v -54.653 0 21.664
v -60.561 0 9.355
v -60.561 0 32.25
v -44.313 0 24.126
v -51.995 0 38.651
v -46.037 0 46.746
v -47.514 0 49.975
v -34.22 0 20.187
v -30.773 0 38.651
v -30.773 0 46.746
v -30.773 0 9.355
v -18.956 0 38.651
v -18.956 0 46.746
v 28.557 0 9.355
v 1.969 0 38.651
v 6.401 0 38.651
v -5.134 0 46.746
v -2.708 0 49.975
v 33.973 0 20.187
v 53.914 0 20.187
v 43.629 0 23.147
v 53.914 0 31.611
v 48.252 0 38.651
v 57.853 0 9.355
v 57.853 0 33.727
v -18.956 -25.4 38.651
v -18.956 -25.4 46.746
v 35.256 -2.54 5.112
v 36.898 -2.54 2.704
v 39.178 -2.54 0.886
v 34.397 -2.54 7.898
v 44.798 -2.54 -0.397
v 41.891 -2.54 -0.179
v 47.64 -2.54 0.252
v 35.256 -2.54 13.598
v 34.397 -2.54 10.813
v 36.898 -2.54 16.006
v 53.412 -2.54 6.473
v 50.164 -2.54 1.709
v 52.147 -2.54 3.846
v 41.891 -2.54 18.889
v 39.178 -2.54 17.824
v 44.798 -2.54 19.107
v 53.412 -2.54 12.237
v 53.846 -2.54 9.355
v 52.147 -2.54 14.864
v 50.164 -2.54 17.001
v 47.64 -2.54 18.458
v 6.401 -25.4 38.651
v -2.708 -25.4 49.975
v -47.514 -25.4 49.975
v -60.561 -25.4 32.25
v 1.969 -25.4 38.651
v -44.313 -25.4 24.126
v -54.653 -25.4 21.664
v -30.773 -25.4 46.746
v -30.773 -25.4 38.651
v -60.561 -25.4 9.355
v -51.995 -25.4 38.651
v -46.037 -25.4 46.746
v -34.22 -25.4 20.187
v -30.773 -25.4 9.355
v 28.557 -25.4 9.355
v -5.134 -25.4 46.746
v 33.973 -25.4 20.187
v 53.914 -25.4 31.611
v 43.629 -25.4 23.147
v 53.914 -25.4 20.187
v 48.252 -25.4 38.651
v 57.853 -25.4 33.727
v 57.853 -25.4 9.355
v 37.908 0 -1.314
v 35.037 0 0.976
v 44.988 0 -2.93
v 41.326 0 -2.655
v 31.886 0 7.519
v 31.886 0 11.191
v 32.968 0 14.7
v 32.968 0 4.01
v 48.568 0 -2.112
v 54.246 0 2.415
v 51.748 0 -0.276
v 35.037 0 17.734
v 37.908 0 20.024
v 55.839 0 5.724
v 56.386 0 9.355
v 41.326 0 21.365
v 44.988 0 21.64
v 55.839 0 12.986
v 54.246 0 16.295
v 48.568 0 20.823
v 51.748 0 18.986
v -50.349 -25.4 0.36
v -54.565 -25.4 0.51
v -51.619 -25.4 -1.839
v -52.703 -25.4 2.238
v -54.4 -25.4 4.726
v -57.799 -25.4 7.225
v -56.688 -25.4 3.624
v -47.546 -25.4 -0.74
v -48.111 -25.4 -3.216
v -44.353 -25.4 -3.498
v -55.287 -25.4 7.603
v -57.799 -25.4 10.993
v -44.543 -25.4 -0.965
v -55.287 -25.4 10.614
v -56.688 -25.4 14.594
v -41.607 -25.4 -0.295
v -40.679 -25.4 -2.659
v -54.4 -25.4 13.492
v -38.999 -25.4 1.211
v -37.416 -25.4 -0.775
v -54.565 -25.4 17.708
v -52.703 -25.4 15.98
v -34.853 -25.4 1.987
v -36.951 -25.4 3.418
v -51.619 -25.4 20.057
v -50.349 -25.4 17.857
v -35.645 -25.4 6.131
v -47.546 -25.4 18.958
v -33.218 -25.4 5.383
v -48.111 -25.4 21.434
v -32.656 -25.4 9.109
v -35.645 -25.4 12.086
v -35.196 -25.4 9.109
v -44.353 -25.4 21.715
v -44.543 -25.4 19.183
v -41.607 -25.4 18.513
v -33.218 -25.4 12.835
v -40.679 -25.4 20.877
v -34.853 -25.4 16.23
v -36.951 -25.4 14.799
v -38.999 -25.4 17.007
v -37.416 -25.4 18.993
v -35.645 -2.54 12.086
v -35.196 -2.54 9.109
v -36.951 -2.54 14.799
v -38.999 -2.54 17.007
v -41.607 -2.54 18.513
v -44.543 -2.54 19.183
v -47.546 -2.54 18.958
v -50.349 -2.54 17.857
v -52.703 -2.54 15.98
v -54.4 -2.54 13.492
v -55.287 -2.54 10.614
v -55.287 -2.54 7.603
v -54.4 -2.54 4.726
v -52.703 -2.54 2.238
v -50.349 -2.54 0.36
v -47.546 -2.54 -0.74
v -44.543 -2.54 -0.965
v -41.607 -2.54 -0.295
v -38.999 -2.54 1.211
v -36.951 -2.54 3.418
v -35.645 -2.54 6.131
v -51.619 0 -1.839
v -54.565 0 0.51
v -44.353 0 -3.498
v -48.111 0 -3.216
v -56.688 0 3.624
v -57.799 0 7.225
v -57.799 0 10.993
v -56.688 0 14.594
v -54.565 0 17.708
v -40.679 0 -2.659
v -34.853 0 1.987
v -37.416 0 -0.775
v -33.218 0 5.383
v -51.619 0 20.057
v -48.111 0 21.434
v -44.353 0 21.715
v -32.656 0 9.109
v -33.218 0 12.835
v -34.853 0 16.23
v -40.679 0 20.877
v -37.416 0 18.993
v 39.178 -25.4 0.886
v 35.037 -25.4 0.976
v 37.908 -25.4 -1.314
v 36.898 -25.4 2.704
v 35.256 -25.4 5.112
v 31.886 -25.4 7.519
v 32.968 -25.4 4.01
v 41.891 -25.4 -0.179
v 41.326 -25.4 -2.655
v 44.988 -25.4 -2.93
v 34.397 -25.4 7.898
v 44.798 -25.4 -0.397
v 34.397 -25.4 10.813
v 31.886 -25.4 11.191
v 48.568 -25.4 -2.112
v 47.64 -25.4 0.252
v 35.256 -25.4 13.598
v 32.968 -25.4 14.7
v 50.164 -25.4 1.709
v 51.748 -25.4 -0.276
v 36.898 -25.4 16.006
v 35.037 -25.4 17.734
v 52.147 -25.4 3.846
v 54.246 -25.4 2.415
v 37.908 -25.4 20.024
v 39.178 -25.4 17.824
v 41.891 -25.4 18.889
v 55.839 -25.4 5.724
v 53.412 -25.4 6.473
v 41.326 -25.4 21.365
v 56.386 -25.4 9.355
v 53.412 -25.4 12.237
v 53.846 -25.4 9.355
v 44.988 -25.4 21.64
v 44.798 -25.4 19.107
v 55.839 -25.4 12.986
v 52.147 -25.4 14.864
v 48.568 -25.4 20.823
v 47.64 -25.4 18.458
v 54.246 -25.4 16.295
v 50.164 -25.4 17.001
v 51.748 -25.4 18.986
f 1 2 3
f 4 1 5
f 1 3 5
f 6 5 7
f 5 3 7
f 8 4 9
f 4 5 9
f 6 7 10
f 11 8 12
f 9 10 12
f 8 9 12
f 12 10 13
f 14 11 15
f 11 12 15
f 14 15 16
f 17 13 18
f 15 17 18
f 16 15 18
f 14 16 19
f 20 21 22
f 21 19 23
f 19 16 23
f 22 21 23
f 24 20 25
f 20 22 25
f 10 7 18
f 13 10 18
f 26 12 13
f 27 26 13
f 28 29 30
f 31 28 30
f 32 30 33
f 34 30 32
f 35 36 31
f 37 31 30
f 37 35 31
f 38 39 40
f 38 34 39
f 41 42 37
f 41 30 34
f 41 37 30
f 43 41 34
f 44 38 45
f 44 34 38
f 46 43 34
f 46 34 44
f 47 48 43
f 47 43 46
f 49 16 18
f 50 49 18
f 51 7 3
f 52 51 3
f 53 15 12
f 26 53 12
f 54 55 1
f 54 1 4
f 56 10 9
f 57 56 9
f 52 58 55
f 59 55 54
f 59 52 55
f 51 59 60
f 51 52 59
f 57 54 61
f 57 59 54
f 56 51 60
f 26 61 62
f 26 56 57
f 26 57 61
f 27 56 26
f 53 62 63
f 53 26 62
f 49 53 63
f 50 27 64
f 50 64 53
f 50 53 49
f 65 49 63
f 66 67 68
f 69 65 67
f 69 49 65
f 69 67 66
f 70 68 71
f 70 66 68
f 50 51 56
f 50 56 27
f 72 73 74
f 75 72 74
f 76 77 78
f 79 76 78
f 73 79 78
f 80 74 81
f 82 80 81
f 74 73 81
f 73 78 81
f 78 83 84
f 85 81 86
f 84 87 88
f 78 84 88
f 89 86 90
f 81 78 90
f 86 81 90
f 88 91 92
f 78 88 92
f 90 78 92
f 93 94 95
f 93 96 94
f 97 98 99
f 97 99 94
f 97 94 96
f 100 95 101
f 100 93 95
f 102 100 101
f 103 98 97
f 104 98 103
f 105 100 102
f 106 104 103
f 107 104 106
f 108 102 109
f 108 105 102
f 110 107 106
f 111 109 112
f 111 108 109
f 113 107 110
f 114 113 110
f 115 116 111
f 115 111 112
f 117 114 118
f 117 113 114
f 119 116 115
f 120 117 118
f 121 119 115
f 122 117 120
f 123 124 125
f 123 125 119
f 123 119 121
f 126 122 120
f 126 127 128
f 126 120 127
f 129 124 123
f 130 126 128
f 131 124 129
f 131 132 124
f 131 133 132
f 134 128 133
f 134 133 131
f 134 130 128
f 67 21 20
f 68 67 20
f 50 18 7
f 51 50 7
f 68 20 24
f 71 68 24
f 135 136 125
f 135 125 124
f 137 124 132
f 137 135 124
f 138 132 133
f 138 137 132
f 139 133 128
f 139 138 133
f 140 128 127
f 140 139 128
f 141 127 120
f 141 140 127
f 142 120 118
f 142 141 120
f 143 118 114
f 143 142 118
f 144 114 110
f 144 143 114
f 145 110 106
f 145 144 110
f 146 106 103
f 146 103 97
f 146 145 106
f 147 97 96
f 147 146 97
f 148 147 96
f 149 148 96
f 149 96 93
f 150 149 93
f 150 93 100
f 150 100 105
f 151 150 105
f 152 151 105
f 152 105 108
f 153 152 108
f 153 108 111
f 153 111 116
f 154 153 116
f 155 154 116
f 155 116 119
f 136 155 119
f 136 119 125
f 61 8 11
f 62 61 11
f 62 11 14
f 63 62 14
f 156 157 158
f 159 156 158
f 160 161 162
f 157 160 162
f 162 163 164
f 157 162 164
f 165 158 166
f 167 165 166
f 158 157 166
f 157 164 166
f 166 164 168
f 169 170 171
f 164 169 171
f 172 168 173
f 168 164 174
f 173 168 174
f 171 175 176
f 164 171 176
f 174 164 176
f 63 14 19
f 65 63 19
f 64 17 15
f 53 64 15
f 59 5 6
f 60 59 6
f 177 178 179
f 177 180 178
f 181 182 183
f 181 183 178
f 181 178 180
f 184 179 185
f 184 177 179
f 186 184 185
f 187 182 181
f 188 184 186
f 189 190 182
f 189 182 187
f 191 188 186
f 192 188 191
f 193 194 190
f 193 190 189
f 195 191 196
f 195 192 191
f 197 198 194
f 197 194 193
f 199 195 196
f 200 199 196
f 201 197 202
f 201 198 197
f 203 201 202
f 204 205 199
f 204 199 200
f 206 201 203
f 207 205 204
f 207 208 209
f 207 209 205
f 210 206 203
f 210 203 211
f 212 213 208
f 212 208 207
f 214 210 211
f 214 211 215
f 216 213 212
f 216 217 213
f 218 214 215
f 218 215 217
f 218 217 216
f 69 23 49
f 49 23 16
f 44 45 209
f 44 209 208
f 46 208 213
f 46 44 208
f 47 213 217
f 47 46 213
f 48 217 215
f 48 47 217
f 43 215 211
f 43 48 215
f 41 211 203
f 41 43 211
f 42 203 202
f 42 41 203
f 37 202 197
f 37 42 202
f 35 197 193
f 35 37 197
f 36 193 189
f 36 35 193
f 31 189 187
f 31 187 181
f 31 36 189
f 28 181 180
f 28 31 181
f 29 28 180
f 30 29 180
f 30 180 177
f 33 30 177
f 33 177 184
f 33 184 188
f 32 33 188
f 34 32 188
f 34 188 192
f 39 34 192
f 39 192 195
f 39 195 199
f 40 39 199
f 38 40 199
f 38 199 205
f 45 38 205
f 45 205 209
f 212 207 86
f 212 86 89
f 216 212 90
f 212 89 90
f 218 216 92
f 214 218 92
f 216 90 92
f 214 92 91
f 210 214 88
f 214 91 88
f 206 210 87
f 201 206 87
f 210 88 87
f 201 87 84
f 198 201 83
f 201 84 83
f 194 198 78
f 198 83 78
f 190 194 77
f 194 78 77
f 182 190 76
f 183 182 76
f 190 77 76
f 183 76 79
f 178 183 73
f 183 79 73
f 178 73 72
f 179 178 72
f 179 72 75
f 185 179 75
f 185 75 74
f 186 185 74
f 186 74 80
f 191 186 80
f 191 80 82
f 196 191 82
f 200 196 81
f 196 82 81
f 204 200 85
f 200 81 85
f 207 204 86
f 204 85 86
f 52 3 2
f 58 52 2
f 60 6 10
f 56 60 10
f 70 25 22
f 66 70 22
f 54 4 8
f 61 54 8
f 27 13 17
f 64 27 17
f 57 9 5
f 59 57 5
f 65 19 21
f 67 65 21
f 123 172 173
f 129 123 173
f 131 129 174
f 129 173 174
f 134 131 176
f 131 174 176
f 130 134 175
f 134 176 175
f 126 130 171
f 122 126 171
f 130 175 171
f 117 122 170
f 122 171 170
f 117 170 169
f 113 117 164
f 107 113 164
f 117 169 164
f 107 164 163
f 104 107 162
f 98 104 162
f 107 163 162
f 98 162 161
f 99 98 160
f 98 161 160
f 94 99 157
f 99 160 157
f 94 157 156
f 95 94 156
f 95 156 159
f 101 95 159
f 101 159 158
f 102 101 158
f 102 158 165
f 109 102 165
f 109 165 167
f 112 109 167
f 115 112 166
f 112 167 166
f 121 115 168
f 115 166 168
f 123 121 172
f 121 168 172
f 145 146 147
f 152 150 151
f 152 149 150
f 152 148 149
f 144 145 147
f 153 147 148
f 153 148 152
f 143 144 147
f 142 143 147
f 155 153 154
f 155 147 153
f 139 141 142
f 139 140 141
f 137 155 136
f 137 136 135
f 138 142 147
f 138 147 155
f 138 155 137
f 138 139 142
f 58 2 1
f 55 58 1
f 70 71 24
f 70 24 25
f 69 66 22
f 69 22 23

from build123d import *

# Parameters (mm, degrees)
F2_DEPTH = 25.4
F0_R     = 12.6420058039
F0_R_2   = 12.3190749573
F3_T     = -2.54
F3_2_T   = -2.54


with BuildPart() as f2:
    # F0 (on Front) → F2 (new body)
    with BuildSketch(Plane.XZ):
        Polygon((-34.2196635902, 20.1871376485), (-30.7730771601, 9.3550160527), (28.5574160516, 9.3550160527), (33.9734777808, 20.1871376485), (43.6286481416, 23.1469707184), (53.9144314826, 20.1871376485), (57.8533858061, 9.3550160527), (57.8533858061, 33.7272919714), (53.9144314826, 31.6114353609), (48.252183944, 38.6509858072), (6.4008003101, 38.6509858072), (-2.7080303989, 49.975477159), (-47.5136302412, 49.975477159), (-60.5614185333, 32.2501845658), (-60.5614185333, 9.3550160527), (-54.6529851854, 21.6642469168), (-44.3132296205, 24.1260938346), align=None)
        Polygon((-30.7730771601, 46.7461037775), (-30.7730771601, 38.6509858072), (-51.9954307024, 38.6509858072), (-46.0365228355, 46.7461037775), align=None, mode=Mode.SUBTRACT)
        Polygon((-5.1341748284, 46.7461037775), (1.9694773946, 38.6509858072), (-18.9562160522, 38.6509858072), (-18.9562160522, 46.7461037775), align=None, mode=Mode.SUBTRACT)
    extrude(amount=F2_DEPTH)


with BuildPart() as f2b:
    # F0 (on Front) → F2, piece 2 (new body)
    with BuildSketch(Plane.XZ):
        with Locations((-45.2979691327, 9.1088311747)):
            Circle(F0_R)
    extrude(amount=F2_DEPTH)

    # F3
    f3_openings = [f2b.faces().sort_by_distance(p)[0] for p in [
        (-45.297969, -25.4, 9.108831),
    ]]
    offset(amount=F3_T, openings=f3_openings)


with BuildPart() as f2c:
    # F0 (on Front) → F2, piece 3 (new body)
    with BuildSketch(Plane.XZ):
        with Locations((44.0670438111, 9.3550160527)):
            Circle(F0_R_2)
    extrude(amount=F2_DEPTH)

    # F3#2
    f3_2_openings = [f2c.faces().sort_by_distance(p)[0] for p in [
        (44.067044, -25.4, 9.355016),
    ]]
    offset(amount=F3_2_T, openings=f3_2_openings)


solid = Compound([f2.part, f2b.part, f2c.part])
